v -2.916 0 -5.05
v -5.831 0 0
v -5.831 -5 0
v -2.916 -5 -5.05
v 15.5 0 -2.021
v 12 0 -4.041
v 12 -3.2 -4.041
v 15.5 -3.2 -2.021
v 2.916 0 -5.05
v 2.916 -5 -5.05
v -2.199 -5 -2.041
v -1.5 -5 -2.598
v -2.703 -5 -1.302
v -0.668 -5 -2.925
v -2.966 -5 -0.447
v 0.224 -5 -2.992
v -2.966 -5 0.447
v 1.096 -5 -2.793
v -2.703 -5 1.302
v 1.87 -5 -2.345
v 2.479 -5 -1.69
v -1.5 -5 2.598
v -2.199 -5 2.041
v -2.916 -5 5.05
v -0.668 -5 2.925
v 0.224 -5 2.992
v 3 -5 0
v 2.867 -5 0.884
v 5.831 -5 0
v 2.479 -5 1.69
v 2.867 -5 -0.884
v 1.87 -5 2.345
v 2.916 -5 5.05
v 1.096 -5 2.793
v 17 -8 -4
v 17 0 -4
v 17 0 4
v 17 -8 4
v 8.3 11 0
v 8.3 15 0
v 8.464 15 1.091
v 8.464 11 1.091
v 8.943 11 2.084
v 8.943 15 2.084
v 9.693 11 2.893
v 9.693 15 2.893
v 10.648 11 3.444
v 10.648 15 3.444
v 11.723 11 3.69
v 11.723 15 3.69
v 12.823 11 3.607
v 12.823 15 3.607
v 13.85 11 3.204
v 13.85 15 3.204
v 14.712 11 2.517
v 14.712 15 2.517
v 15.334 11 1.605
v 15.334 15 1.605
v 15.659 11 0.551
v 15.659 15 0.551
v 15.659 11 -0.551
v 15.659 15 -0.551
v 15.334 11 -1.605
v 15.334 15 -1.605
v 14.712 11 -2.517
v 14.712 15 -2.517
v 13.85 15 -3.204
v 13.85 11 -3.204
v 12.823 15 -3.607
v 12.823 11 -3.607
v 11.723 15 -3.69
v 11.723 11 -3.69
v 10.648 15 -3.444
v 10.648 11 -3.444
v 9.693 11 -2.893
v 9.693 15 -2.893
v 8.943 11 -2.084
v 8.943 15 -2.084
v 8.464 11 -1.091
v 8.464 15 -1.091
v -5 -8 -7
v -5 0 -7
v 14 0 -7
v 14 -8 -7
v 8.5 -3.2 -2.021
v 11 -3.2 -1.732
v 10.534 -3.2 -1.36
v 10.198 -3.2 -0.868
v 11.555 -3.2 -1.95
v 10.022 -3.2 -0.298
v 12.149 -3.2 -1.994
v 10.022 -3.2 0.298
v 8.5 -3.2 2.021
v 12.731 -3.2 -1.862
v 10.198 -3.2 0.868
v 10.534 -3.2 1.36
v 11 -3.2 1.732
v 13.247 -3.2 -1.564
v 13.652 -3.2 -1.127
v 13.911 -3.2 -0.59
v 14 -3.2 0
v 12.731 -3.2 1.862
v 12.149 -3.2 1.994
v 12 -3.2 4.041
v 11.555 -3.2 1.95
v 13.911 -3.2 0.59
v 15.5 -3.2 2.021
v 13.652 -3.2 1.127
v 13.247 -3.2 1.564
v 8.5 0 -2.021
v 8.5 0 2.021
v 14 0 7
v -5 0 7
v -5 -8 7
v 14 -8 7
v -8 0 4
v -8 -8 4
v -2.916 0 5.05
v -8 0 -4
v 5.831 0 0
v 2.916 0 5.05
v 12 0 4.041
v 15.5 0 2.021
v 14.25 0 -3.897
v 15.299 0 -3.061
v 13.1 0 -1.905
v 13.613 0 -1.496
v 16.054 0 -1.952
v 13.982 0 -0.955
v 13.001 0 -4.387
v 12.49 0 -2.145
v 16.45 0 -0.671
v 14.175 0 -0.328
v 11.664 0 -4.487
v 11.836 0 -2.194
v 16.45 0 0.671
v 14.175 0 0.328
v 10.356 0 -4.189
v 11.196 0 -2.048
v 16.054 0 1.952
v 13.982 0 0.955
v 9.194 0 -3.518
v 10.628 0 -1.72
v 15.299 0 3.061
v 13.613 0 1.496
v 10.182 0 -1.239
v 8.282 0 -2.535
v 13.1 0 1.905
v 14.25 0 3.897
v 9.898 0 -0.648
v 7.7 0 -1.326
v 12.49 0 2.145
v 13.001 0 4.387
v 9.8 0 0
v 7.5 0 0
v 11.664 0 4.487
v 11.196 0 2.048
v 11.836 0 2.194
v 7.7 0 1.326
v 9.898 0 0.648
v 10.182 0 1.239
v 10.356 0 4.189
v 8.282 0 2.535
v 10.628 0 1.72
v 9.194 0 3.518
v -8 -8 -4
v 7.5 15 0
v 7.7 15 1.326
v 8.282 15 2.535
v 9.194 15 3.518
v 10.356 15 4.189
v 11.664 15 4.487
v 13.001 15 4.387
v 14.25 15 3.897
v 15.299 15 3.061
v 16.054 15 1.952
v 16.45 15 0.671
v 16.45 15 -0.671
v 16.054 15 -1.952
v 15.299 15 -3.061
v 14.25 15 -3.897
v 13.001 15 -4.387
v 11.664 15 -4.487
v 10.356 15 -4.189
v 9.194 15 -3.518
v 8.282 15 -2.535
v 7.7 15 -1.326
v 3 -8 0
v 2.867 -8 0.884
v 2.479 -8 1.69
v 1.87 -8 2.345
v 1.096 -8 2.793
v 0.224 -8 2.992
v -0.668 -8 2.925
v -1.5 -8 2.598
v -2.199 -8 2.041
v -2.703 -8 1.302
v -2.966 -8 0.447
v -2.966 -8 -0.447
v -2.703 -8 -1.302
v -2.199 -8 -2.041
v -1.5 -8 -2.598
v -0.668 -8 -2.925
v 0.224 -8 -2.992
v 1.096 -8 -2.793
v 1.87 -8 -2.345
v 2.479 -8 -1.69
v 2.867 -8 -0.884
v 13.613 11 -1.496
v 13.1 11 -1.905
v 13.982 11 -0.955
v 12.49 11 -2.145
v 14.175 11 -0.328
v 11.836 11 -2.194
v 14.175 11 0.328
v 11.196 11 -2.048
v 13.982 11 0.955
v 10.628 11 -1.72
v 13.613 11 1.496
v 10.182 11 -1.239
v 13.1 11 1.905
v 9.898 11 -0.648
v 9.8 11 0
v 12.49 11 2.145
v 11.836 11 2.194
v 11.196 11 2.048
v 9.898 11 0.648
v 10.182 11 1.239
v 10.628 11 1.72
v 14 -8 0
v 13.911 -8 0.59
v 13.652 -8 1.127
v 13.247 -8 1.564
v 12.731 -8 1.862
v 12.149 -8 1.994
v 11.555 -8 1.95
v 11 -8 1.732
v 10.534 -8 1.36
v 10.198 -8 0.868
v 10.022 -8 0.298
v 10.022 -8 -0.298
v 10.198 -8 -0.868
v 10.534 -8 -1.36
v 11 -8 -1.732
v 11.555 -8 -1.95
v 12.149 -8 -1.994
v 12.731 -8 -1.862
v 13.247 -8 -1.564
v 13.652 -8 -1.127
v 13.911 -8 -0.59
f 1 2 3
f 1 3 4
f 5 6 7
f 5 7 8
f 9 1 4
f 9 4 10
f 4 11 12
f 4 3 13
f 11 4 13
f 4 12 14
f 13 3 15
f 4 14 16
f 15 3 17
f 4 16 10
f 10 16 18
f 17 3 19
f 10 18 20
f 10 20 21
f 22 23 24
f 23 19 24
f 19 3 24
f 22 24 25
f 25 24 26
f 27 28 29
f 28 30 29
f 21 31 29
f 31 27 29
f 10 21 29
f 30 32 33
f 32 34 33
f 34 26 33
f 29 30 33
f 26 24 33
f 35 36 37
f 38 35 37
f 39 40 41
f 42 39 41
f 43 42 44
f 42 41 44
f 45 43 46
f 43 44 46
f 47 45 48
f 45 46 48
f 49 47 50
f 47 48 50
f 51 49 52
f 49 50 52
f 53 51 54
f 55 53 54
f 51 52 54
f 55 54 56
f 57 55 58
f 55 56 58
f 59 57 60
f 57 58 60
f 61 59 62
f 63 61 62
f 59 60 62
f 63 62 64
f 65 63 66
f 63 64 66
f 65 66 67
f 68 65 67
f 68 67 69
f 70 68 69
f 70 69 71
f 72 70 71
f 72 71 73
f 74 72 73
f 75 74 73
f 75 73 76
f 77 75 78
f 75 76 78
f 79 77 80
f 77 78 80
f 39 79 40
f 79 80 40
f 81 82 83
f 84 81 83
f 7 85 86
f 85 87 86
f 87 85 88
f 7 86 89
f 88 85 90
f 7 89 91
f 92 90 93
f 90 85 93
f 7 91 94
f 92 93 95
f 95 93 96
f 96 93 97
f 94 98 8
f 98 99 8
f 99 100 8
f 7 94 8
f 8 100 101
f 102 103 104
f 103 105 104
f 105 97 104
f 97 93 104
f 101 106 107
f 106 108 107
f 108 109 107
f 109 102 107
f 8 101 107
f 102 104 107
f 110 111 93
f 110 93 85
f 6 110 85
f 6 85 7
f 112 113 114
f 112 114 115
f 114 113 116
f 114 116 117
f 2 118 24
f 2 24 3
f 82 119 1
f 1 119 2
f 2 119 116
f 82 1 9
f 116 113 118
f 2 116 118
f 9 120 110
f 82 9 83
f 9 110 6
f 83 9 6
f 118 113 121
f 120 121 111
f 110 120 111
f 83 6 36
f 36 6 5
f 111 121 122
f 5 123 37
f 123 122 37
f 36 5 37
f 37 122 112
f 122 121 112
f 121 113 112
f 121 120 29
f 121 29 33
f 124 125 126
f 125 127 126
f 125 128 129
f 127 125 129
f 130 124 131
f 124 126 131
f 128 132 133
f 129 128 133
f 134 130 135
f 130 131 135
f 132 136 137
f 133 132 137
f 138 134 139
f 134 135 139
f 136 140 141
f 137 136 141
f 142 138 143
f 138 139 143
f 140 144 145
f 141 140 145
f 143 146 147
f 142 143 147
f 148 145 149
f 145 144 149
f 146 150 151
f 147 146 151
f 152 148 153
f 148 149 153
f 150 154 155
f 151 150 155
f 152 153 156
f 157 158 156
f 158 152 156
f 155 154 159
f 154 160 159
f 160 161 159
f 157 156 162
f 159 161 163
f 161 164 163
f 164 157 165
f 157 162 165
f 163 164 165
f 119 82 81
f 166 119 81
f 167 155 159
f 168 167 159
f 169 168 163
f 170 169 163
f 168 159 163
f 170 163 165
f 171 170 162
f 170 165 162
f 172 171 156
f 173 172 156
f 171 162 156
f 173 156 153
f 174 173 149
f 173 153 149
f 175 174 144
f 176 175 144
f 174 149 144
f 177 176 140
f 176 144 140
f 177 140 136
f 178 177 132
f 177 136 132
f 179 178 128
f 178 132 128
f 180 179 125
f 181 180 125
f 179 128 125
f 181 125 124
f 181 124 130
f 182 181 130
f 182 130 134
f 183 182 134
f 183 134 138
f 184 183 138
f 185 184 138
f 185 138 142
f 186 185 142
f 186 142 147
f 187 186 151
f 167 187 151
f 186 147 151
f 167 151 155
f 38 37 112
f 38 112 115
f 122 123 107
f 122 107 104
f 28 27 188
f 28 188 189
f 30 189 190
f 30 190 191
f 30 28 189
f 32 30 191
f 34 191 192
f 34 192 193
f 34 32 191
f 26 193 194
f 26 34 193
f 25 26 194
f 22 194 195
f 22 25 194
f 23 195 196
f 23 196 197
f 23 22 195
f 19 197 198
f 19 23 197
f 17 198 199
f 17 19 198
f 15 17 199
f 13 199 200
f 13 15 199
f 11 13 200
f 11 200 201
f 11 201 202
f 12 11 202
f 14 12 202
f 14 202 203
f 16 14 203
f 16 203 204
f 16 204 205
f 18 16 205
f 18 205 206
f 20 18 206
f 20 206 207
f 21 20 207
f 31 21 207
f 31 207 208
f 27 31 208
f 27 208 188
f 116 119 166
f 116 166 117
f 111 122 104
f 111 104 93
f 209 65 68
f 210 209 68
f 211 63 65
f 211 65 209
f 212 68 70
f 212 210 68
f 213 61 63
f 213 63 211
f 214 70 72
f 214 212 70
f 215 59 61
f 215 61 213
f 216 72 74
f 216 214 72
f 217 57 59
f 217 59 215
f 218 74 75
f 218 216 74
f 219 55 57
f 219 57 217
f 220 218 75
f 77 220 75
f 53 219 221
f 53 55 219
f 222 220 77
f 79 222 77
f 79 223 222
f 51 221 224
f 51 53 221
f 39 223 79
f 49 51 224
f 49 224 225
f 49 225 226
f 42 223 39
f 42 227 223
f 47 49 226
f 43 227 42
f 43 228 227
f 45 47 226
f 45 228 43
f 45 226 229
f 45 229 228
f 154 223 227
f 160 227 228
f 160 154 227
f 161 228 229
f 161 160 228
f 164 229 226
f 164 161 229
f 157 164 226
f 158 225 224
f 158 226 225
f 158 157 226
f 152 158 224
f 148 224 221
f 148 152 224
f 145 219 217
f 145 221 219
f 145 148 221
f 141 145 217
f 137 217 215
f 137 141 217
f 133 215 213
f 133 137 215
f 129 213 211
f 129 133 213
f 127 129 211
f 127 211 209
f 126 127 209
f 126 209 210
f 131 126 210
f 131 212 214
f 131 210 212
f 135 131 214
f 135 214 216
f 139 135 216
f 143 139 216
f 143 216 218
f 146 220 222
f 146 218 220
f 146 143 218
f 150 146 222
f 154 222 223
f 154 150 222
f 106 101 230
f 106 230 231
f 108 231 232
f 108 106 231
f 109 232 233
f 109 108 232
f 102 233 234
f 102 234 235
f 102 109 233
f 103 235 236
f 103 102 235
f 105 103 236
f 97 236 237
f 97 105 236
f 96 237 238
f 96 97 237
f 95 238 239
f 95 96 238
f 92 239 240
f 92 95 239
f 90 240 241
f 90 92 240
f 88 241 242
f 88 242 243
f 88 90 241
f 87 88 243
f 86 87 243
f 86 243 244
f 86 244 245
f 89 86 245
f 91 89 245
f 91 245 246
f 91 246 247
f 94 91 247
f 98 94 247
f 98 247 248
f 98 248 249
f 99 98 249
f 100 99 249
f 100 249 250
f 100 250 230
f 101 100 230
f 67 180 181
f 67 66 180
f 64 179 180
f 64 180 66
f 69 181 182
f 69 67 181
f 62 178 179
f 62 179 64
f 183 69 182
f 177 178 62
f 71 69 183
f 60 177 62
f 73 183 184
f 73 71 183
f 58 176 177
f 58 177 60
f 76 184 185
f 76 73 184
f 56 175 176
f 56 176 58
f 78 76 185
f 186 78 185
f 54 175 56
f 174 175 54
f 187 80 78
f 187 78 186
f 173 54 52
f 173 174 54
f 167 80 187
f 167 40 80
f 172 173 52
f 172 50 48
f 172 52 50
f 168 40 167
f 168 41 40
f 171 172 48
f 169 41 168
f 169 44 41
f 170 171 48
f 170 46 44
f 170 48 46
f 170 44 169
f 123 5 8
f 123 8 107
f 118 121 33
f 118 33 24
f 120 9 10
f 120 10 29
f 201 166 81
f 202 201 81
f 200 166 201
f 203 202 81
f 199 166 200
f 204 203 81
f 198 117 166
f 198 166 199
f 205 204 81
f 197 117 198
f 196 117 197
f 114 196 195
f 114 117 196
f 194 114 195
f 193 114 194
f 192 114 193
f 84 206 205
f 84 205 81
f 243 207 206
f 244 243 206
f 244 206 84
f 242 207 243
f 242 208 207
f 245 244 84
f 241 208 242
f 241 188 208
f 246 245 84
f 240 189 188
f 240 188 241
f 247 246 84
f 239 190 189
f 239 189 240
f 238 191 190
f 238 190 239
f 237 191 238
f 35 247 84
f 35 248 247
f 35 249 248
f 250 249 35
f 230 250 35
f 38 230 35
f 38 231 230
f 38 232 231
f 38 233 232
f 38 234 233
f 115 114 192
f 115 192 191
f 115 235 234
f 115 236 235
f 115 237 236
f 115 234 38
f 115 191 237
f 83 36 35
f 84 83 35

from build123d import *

# Parameters (mm, degrees)
F0_W     = 25
F0_H     = 14
F0_R     = 3
F0_R_2   = 2
F1_DEPTH = 8
F2_DEPTH = 5
F3_DEPTH = 3.2
F4_SIZE  = 3
F5_R     = 4.5
F5_R_2   = 2.2
F6_DEPTH = 15
F7_R     = 3.7
F8_DEPTH = 4


with BuildPart() as f1:
    # F0 (on Front) → F1 (new body)
    with BuildSketch(Plane.XZ):
        with Locations((4.5, 0)):
            Rectangle(F0_W, F0_H)
        Polygon((-5.8312377188, 0), (-2.9156188594, 5.05), (2.9156188594, 5.05), (5.8312377188, 0), (2.9156188594, -5.05), (-2.9156188594, -5.05), align=None, mode=Mode.SUBTRACT)
        Polygon((12, 4.0414518843), (15.5, 2.0207259422), (15.5, -2.0207259422), (12, -4.0414518843), (8.5, -2.0207259422), (8.5, 2.0207259422), align=None, mode=Mode.SUBTRACT)
        Polygon((2.9156188594, 5.05), (-2.9156188594, 5.05), (-5.8312377188, 0), (-2.9156188594, -5.05), (2.9156188594, -5.05), (5.8312377188, 0), align=None)
        Circle(F0_R, mode=Mode.SUBTRACT)
        Polygon((15.5, -2.0207259422), (15.5, 2.0207259422), (12, 4.0414518843), (8.5, 2.0207259422), (8.5, -2.0207259422), (12, -4.0414518843), align=None)
        with Locations((12, 0)):
            Circle(F0_R_2, mode=Mode.SUBTRACT)
    extrude(amount=F1_DEPTH)

    # F0 (on Front) → F2 (cut)
    with BuildSketch(Plane.XZ):
        Polygon((2.9156188594, 5.05), (-2.9156188594, 5.05), (-5.8312377188, 0), (-2.9156188594, -5.05), (2.9156188594, -5.05), (5.8312377188, 0), align=None)
        Circle(F0_R, mode=Mode.SUBTRACT)
    extrude(amount=F2_DEPTH, mode=Mode.SUBTRACT)

    # F0 (on Front) → F3 (cut)
    with BuildSketch(Plane.XZ):
        Polygon((15.5, -2.0207259422), (15.5, 2.0207259422), (12, 4.0414518843), (8.5, 2.0207259422), (8.5, -2.0207259422), (12, -4.0414518843), align=None)
        with Locations((12, 0)):
            Circle(F0_R_2, mode=Mode.SUBTRACT)
    extrude(amount=F3_DEPTH, mode=Mode.SUBTRACT)

    # F4
    f4_edges = [f1.edges().sort_by_distance(p)[0] for p in [
        (-8, -4, -7),
        (17, -4, -7),
        (-8, -4, 7),
        (17, -4, 7),
    ]]
    chamfer(f4_edges, length=F4_SIZE)


with BuildPart() as f6:
    # F5 (on face) → F6 (new body)
    with BuildSketch(Plane(origin=(0, 0, 0), x_dir=(-1, 0, 0), z_dir=(0, 1, 0))):
        with Locations((-12, 0)):
            Circle(F5_R)
        with Locations((-12, 0)):
            Circle(F5_R_2, mode=Mode.SUBTRACT)
    extrude(amount=F6_DEPTH)

    # F7 (on face) → F8 (cut)
    with BuildSketch(Plane(origin=(0, 15, 0), x_dir=(-1, 0, 0), z_dir=(0, 1, 0))):
        with Locations((-12, 0)):
            Circle(F7_R)
    extrude(amount=-F8_DEPTH, mode=Mode.SUBTRACT)


solid = Compound([f1.part, f6.part])
